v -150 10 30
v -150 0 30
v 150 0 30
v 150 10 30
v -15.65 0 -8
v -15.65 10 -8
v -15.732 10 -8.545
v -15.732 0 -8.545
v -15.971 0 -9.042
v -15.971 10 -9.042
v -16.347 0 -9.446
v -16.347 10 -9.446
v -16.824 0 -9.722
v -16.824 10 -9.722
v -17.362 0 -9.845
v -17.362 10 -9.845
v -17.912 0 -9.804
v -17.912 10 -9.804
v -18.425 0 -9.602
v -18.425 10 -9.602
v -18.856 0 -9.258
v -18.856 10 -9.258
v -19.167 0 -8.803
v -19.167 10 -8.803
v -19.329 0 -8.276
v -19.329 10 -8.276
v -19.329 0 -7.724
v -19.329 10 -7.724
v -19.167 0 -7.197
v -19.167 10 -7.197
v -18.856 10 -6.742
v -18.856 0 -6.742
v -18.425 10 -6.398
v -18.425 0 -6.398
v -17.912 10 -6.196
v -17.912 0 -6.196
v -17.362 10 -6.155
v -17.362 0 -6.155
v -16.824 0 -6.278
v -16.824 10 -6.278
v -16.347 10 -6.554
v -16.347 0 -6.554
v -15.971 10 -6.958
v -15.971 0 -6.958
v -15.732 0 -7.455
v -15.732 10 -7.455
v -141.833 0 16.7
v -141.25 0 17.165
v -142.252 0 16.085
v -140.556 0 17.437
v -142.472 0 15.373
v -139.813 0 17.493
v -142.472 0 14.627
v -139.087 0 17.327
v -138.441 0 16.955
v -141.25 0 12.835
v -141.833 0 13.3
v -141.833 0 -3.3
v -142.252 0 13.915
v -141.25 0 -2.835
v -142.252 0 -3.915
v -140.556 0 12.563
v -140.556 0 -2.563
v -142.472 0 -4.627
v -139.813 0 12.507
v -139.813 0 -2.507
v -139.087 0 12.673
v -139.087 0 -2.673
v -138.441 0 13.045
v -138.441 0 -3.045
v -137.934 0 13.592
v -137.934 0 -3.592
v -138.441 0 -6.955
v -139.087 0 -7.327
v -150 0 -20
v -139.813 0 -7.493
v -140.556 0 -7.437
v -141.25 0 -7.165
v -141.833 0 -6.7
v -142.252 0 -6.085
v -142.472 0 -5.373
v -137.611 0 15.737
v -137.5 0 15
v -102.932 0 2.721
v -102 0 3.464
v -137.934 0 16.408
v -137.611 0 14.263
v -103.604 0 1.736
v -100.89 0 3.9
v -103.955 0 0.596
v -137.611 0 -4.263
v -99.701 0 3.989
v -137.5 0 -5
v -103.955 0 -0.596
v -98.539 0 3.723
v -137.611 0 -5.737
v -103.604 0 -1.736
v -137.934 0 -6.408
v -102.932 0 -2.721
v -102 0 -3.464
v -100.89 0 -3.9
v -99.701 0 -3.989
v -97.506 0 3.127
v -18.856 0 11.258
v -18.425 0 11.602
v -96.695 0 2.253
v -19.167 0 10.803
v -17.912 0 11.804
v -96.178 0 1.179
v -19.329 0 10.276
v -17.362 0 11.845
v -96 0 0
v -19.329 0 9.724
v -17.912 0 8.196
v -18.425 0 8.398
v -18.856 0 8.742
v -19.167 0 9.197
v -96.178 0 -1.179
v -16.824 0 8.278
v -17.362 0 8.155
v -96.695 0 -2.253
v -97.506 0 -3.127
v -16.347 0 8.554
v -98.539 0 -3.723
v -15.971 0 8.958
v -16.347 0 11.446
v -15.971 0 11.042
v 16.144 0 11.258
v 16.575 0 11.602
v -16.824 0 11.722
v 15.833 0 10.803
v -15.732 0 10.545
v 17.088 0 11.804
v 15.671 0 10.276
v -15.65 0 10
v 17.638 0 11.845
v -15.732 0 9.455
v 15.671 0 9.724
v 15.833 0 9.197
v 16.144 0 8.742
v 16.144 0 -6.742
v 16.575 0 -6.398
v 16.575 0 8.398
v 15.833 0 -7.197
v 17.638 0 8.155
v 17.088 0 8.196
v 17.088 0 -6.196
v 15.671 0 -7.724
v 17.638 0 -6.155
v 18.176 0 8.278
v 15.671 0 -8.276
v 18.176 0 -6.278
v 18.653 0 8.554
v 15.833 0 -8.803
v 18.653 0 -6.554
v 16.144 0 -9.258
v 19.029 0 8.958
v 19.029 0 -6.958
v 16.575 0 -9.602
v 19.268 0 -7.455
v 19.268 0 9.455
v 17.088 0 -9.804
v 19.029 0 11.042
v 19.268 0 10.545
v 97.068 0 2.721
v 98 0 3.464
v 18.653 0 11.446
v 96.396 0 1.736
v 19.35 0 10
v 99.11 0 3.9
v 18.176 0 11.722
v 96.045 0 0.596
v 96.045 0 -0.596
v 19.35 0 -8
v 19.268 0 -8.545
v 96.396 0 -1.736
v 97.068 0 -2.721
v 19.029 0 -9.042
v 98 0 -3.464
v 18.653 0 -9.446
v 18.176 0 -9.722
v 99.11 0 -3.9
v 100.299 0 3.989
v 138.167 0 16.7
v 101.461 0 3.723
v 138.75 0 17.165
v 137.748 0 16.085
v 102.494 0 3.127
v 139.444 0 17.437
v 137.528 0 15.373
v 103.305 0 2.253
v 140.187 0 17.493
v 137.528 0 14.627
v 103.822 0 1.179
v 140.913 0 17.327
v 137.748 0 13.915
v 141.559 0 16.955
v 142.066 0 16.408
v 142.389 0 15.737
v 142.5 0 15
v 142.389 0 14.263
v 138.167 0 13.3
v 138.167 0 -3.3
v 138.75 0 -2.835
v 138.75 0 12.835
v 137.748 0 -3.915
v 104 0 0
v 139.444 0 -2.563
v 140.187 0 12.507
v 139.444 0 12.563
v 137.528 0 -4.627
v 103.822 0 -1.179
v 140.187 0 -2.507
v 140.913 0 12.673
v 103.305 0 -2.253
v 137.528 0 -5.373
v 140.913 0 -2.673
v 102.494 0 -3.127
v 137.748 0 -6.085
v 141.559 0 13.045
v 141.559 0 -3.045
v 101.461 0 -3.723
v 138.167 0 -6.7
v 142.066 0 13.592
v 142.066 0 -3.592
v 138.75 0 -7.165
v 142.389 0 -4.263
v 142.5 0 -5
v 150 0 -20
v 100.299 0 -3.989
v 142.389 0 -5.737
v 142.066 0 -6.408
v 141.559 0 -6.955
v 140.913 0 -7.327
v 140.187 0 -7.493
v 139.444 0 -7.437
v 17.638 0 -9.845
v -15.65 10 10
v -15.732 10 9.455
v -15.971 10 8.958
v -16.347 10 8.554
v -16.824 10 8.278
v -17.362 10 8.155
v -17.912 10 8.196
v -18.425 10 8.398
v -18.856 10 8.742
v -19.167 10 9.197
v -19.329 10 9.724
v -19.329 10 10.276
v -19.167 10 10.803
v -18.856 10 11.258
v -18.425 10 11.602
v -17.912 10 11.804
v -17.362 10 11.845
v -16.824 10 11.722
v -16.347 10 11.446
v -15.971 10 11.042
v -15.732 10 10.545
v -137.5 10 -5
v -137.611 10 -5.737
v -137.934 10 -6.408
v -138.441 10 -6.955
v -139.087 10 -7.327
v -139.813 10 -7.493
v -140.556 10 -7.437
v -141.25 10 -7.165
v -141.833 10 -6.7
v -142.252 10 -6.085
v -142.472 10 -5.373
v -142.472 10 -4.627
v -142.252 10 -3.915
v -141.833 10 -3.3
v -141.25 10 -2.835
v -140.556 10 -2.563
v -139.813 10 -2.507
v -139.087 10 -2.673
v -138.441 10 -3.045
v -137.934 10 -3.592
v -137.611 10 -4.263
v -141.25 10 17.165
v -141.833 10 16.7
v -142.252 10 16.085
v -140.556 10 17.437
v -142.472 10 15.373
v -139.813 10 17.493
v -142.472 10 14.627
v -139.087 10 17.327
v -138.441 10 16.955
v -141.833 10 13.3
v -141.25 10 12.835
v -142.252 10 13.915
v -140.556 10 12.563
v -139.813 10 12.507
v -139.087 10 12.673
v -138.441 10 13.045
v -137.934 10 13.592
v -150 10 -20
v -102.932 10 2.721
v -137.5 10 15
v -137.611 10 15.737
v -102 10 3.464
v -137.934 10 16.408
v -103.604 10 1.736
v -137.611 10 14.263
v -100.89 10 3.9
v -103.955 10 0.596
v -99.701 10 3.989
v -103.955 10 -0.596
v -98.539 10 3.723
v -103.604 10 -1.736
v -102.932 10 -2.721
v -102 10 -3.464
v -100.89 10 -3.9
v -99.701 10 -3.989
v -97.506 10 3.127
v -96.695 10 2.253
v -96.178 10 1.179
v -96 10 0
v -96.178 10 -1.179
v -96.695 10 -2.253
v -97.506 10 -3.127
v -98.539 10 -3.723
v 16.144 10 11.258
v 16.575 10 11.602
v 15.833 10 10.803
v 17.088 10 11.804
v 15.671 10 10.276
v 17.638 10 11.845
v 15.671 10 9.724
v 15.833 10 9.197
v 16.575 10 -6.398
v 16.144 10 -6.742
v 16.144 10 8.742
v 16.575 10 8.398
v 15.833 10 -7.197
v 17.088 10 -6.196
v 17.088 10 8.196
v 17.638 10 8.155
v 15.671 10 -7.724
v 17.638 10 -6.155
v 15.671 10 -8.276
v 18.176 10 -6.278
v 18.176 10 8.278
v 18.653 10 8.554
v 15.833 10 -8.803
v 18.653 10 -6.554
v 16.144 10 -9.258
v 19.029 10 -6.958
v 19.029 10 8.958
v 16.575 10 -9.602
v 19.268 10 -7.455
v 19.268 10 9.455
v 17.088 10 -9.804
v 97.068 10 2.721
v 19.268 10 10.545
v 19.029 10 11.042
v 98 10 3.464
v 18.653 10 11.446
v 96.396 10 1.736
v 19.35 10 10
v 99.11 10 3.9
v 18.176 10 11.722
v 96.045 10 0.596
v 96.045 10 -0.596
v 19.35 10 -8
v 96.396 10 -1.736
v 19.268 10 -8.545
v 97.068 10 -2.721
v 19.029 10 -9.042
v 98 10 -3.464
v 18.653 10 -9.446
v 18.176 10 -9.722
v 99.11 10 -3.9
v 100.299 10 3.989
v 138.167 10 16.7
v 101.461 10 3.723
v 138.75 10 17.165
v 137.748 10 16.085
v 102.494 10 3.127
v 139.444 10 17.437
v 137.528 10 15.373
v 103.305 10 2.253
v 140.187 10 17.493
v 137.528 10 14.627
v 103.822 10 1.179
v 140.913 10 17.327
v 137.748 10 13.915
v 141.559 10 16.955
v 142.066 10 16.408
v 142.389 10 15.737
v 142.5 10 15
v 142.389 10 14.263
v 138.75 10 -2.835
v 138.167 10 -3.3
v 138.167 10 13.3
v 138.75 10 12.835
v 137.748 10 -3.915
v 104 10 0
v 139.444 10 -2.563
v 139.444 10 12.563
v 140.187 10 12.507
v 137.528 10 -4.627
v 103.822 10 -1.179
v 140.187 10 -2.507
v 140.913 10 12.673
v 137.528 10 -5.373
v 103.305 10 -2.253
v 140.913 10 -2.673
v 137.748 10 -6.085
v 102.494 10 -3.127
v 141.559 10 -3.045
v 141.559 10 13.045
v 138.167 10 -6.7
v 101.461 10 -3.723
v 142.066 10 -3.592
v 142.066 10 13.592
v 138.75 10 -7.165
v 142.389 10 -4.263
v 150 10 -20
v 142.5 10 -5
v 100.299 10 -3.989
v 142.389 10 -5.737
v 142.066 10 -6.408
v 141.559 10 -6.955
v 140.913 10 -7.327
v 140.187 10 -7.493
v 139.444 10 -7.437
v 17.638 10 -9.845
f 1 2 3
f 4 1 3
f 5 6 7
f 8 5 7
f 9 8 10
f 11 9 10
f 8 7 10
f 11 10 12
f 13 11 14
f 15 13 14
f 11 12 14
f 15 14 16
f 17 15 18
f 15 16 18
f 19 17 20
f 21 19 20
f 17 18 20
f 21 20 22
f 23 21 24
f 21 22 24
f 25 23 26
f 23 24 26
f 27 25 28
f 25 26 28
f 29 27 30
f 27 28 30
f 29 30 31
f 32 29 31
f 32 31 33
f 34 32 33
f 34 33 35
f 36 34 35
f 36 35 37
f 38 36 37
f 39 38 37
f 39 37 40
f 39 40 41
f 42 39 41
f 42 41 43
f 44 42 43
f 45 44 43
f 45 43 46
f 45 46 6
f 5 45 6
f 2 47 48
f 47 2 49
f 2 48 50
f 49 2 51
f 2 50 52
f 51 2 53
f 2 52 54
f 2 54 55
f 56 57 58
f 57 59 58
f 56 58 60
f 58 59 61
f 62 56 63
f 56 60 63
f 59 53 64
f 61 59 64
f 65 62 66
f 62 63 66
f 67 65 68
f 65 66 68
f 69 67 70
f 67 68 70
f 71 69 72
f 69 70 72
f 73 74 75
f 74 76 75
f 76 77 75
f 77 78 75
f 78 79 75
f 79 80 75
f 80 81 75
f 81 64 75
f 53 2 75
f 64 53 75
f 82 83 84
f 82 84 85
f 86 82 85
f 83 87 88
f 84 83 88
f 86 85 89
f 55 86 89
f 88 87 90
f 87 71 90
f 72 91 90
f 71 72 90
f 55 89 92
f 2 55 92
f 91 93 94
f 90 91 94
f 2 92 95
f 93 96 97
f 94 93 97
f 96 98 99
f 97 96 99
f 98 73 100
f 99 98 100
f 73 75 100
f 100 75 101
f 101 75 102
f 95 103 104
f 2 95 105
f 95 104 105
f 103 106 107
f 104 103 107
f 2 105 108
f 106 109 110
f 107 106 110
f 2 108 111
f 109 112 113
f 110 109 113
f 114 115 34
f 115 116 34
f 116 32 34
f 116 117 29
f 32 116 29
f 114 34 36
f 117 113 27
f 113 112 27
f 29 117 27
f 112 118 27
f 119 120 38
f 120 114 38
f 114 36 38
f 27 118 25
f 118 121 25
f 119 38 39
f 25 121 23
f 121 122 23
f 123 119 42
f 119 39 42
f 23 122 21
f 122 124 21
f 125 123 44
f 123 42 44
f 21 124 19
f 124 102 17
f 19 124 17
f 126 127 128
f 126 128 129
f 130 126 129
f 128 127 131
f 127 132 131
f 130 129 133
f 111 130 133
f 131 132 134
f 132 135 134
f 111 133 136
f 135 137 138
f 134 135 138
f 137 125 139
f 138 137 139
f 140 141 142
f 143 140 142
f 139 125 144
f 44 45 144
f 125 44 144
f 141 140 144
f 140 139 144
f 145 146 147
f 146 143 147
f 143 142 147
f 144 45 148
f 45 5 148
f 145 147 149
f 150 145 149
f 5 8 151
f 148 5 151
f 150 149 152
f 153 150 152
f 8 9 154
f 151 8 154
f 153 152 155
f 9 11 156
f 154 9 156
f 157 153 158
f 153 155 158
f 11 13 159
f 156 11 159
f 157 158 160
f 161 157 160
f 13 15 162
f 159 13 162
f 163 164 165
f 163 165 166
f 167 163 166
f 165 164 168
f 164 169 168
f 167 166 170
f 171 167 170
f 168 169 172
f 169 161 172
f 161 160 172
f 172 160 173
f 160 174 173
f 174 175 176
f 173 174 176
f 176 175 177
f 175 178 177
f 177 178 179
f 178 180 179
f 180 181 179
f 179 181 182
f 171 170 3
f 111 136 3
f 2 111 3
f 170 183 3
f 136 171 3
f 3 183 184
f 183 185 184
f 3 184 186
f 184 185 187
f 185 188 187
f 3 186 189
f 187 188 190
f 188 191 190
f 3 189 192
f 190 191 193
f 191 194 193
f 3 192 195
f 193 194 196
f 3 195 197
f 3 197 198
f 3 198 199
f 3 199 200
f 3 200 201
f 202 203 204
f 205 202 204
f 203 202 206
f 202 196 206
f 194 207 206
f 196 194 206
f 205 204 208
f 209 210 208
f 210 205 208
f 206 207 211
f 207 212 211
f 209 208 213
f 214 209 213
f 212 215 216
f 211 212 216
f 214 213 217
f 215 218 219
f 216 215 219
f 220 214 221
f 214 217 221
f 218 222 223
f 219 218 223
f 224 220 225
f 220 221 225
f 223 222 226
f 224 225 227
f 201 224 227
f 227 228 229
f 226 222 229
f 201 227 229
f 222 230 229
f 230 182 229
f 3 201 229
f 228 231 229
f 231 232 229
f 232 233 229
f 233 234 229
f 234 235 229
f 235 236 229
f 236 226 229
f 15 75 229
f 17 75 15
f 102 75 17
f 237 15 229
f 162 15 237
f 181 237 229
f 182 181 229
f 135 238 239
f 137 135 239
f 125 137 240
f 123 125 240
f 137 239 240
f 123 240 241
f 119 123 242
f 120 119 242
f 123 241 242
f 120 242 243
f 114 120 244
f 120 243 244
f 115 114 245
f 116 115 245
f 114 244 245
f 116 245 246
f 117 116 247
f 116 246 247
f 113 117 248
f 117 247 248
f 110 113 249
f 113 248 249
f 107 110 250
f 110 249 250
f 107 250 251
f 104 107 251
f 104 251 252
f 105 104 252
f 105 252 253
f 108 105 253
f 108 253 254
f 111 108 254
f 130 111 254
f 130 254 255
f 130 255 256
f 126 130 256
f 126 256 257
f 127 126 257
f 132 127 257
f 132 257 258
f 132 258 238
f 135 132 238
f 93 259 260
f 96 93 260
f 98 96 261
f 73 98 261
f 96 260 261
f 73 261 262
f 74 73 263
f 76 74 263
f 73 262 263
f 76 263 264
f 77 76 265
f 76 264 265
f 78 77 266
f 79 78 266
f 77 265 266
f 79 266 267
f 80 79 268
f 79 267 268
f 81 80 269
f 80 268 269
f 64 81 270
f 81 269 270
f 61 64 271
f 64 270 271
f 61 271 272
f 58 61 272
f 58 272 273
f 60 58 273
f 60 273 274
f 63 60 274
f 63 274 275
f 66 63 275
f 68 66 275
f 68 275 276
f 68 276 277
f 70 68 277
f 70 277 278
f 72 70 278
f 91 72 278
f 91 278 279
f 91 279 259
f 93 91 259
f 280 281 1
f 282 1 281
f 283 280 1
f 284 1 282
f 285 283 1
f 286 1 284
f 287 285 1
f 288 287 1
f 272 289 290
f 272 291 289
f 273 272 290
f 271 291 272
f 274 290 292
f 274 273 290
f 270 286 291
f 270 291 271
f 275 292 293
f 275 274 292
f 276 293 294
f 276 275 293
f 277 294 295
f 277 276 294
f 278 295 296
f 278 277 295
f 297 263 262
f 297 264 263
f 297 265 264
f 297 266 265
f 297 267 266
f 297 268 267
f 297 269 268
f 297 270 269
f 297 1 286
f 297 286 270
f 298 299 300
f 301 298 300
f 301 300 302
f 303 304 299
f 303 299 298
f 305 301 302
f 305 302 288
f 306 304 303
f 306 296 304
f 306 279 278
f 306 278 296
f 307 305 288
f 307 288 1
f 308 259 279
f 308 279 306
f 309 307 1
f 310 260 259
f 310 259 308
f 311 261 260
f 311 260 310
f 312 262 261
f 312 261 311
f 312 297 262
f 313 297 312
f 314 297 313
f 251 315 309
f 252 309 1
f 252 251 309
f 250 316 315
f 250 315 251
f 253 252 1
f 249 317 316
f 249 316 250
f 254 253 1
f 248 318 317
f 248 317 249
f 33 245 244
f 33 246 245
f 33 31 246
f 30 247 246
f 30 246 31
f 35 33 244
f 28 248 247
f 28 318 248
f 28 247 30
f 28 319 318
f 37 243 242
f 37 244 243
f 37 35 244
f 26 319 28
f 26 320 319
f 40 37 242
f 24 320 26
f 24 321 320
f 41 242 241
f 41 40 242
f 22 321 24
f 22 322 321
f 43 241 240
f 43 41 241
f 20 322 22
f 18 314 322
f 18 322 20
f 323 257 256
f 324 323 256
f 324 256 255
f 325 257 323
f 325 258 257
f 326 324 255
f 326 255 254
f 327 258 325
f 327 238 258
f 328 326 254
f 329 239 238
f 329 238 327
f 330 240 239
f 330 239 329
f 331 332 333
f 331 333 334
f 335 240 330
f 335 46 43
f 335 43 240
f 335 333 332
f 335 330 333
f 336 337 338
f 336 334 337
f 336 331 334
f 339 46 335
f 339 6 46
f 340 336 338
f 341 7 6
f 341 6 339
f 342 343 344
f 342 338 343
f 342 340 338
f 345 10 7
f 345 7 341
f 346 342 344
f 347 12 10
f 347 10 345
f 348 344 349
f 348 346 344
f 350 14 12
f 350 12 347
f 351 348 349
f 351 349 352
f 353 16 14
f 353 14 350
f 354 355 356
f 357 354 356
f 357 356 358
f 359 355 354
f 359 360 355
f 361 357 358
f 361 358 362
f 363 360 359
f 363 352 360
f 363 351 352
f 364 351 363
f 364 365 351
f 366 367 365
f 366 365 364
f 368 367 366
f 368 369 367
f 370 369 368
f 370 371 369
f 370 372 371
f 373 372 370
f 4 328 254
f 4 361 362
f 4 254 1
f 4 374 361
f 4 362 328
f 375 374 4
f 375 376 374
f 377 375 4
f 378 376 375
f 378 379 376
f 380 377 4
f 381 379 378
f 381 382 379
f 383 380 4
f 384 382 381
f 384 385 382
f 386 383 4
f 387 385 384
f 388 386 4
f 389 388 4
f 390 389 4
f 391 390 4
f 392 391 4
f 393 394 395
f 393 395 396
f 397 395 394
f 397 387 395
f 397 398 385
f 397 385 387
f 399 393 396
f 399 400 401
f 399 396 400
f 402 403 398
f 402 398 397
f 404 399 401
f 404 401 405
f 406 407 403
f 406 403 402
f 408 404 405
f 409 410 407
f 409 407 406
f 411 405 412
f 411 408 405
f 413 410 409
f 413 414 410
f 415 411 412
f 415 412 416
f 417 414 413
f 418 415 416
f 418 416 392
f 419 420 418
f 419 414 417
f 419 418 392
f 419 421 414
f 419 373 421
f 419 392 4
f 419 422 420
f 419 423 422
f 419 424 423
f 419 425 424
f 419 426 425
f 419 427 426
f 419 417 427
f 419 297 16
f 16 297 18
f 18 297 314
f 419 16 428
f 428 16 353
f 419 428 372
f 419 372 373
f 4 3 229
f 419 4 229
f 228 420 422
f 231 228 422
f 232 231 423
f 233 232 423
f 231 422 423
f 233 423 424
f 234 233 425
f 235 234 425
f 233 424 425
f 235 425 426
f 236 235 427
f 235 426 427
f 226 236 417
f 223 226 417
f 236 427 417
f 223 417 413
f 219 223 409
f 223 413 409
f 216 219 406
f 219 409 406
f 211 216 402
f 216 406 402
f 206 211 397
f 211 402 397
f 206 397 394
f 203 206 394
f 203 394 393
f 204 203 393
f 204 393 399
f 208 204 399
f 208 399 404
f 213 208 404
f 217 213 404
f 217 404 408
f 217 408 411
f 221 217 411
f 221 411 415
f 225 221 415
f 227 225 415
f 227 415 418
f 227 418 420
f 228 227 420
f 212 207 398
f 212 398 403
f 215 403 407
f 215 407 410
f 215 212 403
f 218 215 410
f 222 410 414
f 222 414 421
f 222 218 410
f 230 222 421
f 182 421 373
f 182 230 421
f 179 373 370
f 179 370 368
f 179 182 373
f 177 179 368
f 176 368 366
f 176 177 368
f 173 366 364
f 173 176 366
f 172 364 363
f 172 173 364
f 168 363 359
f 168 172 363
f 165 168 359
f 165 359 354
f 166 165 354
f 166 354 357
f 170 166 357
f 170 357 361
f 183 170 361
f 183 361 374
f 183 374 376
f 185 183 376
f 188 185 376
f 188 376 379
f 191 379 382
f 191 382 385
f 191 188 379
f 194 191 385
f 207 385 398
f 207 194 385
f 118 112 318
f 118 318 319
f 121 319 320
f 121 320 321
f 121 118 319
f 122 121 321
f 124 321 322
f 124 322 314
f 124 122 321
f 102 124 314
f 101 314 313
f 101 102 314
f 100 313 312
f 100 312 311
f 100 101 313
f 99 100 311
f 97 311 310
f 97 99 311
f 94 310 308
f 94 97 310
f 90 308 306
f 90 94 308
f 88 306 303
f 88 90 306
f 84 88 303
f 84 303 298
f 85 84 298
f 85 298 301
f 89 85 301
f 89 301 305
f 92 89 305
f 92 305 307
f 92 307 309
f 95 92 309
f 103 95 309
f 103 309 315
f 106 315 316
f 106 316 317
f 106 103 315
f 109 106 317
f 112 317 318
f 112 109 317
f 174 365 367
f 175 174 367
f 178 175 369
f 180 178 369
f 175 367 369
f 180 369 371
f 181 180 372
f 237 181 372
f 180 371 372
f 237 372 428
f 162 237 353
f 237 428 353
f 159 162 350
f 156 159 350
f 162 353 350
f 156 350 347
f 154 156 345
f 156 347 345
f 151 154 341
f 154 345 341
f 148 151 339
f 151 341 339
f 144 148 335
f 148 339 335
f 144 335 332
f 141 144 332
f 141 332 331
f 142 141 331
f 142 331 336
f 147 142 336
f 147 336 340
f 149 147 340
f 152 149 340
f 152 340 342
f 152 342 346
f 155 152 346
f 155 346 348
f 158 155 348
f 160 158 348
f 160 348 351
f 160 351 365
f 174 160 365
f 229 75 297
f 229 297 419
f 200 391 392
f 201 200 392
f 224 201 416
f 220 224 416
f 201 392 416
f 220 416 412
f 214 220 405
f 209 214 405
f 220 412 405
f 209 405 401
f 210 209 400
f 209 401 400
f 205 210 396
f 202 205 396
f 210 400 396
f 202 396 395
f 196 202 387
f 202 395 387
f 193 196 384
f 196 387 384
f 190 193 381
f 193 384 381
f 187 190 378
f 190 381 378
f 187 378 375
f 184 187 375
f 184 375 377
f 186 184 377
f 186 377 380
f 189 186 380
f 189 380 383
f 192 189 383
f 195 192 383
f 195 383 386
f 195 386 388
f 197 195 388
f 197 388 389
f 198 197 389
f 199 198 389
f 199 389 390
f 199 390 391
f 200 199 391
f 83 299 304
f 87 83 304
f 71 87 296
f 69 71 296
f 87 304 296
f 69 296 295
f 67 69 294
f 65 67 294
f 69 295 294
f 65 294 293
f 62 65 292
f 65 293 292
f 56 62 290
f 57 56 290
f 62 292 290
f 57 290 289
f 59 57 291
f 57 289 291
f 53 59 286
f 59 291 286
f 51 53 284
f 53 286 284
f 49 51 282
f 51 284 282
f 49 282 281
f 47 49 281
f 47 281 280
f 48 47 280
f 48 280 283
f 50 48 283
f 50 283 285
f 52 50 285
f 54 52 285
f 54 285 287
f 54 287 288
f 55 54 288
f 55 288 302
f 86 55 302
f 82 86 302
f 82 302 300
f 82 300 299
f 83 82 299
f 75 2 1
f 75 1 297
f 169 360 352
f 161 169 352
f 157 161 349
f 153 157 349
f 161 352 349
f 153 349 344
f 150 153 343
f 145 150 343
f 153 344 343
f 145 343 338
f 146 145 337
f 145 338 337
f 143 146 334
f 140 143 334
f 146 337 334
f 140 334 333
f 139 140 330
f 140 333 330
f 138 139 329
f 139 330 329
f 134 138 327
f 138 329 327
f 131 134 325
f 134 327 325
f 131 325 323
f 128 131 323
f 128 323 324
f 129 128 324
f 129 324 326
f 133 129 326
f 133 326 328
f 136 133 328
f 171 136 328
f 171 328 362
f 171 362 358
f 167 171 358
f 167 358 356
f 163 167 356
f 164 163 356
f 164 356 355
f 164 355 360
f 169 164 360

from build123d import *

# Parameters (mm, degrees)
SKETCH1_W           = 300
SKETCH1_H           = 50
SKETCH1_R           = 4
MAIN_DEPTH          = 10
SKETCH4_R           = 2.5
MOUNT_DEPTH         = 11
SKETCH3_R           = 1.85
BEARING_MOUNT_DEPTH = 11


with BuildPart() as part:
    # Sketch1 → main (new body)
    with BuildSketch(Plane(origin=(0, 0, 0), x_dir=(1, 0, 0), z_dir=(0, 1, 0))):
        with Locations((0, -5)):
            Rectangle(SKETCH1_W, SKETCH1_H)
        with Locations((-100, 0)):
            Circle(SKETCH1_R, mode=Mode.SUBTRACT)
        with Locations((100, 0)):
            Circle(SKETCH1_R, mode=Mode.SUBTRACT)
    extrude(amount=MAIN_DEPTH)

    # Sketch4 → mount (cut, through all)
    with BuildSketch(Plane(origin=(0, 10, 0), x_dir=(1, 0, 0), z_dir=(0, 1, 0))):
        with Locations((-140, 5)):
            Circle(SKETCH4_R)
        with Locations((-140, -15)):
            Circle(SKETCH4_R)
        with Locations((140, -15)):
            Circle(SKETCH4_R)
        with Locations((140, 5)):
            Circle(SKETCH4_R)
    extrude(amount=-MOUNT_DEPTH, mode=Mode.SUBTRACT)

    # Sketch3 → bearing_mount (cut, through all)
    with BuildSketch(Plane(origin=(0, 10, 0), x_dir=(1, 0, 0), z_dir=(0, 1, 0))):
        with Locations((-17.5, 8)):
            Circle(SKETCH3_R)
        with Locations((17.5, 8)):
            Circle(SKETCH3_R)
        with Locations((-17.5, -10)):
            Circle(SKETCH3_R)
        with Locations((17.5, -10)):
            Circle(SKETCH3_R)
    extrude(amount=-BEARING_MOUNT_DEPTH, mode=Mode.SUBTRACT)


solid = part.part
